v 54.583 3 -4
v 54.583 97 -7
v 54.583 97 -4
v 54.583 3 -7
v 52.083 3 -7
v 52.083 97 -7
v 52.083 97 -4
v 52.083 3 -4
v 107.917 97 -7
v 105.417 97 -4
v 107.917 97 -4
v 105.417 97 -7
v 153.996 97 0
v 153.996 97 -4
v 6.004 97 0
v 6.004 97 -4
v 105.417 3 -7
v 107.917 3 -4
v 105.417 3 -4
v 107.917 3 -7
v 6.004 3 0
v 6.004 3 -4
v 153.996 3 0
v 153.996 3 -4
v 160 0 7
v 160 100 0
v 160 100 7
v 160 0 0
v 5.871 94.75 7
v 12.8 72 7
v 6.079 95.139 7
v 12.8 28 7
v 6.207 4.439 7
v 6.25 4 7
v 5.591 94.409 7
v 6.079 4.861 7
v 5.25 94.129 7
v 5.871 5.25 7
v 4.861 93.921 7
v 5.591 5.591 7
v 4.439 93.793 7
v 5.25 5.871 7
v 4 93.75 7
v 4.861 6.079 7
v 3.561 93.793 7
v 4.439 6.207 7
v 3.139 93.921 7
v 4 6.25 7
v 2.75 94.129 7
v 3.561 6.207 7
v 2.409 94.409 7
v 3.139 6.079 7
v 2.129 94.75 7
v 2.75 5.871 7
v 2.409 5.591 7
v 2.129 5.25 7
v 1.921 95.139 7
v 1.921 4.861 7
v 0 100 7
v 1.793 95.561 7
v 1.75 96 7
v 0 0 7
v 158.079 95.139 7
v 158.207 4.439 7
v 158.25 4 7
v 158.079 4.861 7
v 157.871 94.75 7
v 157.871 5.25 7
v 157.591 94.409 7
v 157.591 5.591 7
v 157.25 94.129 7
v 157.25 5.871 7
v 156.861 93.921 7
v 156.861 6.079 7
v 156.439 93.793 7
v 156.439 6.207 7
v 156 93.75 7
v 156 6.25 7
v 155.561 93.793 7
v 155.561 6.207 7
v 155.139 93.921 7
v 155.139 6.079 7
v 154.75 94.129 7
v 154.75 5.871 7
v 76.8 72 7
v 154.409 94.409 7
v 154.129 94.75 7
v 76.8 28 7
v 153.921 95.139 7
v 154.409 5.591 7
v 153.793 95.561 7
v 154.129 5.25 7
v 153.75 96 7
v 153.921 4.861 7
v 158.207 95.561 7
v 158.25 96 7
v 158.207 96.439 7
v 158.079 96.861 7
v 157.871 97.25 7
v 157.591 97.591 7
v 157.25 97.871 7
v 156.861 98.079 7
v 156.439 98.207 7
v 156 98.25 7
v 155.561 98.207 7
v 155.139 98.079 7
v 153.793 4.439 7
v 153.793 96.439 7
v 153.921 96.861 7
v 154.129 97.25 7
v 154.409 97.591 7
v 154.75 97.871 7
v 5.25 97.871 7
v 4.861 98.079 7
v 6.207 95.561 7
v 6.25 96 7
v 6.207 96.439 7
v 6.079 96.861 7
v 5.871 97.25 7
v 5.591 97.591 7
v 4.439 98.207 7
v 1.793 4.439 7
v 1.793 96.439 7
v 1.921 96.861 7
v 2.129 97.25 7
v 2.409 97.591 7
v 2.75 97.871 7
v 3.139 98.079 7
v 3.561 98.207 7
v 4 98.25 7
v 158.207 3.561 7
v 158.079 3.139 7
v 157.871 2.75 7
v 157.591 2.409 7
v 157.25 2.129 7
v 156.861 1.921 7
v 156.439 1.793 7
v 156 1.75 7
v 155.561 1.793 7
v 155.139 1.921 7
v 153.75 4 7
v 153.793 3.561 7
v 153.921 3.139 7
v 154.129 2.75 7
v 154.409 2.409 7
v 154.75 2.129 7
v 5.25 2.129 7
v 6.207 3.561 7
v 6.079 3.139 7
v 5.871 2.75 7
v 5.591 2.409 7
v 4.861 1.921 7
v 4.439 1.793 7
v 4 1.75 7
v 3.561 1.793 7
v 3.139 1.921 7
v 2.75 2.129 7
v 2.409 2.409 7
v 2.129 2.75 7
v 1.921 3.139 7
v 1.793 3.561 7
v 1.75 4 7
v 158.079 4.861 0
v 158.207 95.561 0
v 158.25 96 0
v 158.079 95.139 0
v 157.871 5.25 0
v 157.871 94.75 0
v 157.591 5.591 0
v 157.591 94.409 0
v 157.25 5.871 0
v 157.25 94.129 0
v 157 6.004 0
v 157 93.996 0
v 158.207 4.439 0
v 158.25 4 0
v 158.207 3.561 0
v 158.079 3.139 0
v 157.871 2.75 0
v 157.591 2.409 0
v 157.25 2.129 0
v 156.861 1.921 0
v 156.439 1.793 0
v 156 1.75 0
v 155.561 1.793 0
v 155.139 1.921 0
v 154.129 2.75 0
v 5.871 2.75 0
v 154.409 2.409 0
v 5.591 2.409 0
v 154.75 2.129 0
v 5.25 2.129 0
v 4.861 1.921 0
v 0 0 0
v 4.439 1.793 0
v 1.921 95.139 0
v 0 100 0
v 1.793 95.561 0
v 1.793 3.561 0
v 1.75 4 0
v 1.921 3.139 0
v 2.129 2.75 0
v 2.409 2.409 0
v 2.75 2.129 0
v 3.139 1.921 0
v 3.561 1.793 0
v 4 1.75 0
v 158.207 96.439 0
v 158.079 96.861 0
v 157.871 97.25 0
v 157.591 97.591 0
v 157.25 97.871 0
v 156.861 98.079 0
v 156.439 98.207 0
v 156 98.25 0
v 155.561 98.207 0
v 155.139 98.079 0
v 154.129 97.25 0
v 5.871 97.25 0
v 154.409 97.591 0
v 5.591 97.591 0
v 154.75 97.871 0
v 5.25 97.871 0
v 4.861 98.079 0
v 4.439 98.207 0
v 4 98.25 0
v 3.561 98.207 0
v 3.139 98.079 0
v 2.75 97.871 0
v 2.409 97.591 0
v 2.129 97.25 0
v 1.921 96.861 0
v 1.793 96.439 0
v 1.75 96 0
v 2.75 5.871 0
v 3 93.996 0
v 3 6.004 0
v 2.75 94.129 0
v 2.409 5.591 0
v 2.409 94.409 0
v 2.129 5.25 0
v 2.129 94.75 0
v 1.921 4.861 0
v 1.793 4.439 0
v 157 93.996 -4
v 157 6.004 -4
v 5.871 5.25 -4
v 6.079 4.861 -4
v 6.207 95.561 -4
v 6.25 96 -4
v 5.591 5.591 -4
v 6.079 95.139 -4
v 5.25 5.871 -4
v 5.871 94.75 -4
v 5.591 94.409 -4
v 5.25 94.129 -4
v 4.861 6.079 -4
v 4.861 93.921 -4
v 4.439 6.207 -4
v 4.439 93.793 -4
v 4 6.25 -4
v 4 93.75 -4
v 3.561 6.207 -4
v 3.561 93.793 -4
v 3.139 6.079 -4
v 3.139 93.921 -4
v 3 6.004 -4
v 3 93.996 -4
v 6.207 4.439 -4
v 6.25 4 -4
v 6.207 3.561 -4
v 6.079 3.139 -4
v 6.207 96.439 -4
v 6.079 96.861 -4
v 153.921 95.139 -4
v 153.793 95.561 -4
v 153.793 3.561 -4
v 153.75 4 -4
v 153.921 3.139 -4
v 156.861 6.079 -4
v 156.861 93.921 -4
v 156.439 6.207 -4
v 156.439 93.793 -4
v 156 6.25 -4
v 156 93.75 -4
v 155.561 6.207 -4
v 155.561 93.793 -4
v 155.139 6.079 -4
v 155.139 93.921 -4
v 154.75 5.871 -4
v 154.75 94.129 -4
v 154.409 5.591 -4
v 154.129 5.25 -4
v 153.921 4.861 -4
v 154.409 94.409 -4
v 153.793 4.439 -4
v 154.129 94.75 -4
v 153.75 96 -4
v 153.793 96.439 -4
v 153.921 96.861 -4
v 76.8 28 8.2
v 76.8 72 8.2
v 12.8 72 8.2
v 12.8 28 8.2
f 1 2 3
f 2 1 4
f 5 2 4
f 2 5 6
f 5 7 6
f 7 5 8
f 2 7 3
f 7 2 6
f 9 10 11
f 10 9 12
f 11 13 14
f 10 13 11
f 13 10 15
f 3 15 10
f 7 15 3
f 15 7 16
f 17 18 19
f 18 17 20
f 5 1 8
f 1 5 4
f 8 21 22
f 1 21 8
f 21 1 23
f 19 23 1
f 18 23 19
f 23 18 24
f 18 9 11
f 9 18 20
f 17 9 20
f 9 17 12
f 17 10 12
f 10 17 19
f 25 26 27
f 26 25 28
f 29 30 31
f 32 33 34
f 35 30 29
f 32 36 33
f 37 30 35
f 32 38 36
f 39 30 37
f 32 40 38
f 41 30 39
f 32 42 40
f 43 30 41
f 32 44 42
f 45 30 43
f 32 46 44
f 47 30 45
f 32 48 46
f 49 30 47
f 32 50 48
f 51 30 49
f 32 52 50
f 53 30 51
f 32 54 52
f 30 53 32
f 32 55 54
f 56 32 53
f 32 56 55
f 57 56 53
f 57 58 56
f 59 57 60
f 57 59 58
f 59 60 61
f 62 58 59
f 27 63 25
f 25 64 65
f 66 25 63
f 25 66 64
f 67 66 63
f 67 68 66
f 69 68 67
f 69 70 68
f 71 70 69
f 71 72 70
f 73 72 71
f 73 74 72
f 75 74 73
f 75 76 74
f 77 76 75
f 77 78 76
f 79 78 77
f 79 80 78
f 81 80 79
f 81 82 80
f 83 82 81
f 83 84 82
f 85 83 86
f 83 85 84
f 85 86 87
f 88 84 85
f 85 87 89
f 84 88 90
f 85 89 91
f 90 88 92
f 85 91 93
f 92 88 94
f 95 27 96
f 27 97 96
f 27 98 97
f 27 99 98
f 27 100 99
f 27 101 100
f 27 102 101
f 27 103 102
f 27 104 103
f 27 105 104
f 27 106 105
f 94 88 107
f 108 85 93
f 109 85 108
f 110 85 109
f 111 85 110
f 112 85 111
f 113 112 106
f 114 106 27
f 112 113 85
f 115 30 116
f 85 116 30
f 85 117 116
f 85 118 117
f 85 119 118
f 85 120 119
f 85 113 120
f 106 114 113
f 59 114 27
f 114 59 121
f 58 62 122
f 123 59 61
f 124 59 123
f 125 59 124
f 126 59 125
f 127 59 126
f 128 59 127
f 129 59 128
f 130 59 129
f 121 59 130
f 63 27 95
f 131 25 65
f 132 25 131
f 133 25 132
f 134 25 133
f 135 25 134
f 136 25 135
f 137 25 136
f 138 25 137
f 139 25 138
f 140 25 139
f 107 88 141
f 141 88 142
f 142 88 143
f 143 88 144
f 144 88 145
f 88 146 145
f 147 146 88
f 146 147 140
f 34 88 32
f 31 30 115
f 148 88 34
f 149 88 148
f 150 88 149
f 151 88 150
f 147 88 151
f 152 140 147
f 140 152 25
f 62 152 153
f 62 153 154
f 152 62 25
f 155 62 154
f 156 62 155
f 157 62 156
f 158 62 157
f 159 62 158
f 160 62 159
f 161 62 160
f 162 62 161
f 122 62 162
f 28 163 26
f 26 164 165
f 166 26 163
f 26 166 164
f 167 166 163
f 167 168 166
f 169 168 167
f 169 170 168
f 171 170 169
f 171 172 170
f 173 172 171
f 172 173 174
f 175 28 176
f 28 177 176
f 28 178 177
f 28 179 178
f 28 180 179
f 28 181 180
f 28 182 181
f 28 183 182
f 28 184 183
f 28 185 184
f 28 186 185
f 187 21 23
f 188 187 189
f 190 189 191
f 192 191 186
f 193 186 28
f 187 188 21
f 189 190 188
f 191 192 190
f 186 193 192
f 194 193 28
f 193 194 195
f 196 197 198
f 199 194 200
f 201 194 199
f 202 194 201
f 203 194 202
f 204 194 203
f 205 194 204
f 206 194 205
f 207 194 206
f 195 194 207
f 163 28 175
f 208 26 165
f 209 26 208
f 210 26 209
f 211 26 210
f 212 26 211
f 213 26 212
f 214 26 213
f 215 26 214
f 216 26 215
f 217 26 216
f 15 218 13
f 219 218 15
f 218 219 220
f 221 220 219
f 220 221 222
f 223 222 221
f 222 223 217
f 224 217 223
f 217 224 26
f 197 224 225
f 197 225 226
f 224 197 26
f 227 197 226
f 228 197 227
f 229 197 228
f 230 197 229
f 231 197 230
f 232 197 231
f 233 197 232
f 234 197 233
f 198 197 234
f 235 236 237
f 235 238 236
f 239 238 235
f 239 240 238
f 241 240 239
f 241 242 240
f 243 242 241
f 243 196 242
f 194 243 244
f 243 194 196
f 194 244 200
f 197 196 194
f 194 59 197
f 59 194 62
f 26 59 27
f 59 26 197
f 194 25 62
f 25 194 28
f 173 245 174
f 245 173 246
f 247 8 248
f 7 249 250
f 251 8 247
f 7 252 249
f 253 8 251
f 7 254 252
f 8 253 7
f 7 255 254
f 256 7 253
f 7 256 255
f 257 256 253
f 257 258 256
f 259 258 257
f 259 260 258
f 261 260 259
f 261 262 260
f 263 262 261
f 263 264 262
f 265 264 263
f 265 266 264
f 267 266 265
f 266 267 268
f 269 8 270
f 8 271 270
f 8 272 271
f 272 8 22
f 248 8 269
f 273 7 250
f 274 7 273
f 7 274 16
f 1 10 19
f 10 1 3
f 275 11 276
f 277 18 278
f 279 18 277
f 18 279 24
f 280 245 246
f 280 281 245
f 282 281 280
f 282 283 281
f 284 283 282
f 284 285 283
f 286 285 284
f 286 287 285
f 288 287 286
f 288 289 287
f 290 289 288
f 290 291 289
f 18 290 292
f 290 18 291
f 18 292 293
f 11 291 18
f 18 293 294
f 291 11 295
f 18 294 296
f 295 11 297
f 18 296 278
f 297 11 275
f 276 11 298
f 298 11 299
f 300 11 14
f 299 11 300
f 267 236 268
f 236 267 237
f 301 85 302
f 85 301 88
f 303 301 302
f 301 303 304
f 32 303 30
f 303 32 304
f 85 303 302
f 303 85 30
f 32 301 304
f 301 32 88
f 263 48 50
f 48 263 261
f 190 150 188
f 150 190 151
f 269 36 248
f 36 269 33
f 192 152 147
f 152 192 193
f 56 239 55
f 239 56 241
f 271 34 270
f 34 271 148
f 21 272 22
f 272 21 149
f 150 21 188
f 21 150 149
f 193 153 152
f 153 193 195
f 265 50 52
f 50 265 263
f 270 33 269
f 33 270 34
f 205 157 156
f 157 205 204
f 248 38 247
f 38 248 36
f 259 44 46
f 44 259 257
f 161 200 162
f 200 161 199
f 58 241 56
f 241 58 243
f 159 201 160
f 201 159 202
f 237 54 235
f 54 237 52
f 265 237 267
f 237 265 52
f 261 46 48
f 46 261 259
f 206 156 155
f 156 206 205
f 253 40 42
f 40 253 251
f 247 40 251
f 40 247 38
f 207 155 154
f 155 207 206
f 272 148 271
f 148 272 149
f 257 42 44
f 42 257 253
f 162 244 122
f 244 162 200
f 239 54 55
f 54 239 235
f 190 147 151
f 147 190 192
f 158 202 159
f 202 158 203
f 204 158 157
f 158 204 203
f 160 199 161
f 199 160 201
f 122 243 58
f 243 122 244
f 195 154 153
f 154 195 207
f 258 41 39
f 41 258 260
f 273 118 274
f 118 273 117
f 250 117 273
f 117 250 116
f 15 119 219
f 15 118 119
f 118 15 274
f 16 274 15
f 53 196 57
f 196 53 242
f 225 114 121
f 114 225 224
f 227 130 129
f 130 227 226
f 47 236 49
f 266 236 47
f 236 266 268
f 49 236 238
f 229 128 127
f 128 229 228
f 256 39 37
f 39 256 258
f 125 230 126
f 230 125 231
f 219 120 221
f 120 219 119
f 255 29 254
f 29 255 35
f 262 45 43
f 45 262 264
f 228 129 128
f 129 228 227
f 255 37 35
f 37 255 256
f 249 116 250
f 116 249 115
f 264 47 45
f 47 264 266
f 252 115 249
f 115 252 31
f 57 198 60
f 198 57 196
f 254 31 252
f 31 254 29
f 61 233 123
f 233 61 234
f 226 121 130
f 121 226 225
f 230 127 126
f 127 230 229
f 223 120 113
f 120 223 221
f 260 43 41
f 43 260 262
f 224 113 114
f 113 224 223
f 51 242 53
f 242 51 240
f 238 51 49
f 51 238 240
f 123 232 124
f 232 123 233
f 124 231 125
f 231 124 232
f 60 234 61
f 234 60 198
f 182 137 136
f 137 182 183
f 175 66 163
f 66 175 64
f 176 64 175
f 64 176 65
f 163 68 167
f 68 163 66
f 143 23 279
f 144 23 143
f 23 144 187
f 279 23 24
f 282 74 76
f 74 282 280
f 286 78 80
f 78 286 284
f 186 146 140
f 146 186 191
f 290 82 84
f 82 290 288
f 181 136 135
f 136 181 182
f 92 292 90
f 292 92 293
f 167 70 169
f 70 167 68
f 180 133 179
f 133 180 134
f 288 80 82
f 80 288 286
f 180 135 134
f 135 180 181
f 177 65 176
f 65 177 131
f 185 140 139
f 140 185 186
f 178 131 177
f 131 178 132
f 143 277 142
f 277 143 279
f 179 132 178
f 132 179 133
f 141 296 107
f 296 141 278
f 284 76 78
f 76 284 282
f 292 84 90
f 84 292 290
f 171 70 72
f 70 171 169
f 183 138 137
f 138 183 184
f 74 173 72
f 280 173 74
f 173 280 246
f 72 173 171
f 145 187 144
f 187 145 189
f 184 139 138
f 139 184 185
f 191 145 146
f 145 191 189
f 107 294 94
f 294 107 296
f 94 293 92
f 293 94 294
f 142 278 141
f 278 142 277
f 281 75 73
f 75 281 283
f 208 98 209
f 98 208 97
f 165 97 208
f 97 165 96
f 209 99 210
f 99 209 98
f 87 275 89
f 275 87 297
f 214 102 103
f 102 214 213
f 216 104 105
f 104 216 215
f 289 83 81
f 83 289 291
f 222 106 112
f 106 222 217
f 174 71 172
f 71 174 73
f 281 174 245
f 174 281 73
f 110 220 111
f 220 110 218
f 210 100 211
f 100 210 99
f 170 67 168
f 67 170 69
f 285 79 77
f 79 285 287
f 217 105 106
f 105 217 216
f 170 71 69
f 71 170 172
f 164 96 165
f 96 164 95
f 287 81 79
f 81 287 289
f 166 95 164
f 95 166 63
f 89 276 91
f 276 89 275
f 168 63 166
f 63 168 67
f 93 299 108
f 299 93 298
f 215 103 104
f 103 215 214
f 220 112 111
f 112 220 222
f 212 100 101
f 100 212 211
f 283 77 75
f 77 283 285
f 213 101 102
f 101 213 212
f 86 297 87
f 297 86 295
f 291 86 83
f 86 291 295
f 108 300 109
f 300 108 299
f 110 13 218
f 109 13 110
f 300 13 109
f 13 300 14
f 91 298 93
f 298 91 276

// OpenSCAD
$fn = 32;

// ----------------------------------------------------------------------
// Enclosure lid: 160 x 100 x 7 mm, 4 bolt holes
// ----------------------------------------------------------------------

// --- parameters (mm) ---
length = 160;             // lid length, X
width = 100;              // lid width, Y
plate_t = 7;              // lid plate thickness
bolt_d = 4.5;             // bolt clearance
boss_lip = 4;             // bolt hole inset from the corner
sink = 1;                 // overlap of the lip and ribs into the plate
lip_h = 5;                // lip height below the plate
lip_wall = 3;             // lip wall thickness
rib_n = 2;                // stiffening ribs
rib_t = 2.5;              // rib thickness
rib_h = 8;                // rib height below the plate
label_h = 1.2;            // raised marking pad

module plate() {
  cube([length, width, plate_t]);
  /* lip that drops into the housing opening, sunk into the plate */
  translate([lip_wall, lip_wall, -lip_h + sink]) cube([length - 2 * lip_wall, width - 2 * lip_wall, lip_h]);
  /* stiffening ribs under the plate */
  for (i = [1 : rib_n]) translate([length * i / (rib_n + 1) - rib_t / 2, lip_wall, -rib_h + sink]) cube([rib_t, width - 2 * lip_wall, rib_h]);
  /* raised marking pad on top, sunk 1 mm into the plate */
  translate([length * 0.08, width * 0.28, plate_t - 1]) cube([length * 0.4, width * 0.44, label_h + 1]);
}

difference() {
  plate();
  /* bolt pattern matching the corner bosses */
  for (sx = [0, 1]) for (sy = [0, 1])
    translate([sx * (length - 2 * boss_lip) + boss_lip, sy * (width - 2 * boss_lip) + boss_lip, -lip_h - 1])
      cylinder(h = plate_t + lip_h + 2, d = bolt_d);
}
